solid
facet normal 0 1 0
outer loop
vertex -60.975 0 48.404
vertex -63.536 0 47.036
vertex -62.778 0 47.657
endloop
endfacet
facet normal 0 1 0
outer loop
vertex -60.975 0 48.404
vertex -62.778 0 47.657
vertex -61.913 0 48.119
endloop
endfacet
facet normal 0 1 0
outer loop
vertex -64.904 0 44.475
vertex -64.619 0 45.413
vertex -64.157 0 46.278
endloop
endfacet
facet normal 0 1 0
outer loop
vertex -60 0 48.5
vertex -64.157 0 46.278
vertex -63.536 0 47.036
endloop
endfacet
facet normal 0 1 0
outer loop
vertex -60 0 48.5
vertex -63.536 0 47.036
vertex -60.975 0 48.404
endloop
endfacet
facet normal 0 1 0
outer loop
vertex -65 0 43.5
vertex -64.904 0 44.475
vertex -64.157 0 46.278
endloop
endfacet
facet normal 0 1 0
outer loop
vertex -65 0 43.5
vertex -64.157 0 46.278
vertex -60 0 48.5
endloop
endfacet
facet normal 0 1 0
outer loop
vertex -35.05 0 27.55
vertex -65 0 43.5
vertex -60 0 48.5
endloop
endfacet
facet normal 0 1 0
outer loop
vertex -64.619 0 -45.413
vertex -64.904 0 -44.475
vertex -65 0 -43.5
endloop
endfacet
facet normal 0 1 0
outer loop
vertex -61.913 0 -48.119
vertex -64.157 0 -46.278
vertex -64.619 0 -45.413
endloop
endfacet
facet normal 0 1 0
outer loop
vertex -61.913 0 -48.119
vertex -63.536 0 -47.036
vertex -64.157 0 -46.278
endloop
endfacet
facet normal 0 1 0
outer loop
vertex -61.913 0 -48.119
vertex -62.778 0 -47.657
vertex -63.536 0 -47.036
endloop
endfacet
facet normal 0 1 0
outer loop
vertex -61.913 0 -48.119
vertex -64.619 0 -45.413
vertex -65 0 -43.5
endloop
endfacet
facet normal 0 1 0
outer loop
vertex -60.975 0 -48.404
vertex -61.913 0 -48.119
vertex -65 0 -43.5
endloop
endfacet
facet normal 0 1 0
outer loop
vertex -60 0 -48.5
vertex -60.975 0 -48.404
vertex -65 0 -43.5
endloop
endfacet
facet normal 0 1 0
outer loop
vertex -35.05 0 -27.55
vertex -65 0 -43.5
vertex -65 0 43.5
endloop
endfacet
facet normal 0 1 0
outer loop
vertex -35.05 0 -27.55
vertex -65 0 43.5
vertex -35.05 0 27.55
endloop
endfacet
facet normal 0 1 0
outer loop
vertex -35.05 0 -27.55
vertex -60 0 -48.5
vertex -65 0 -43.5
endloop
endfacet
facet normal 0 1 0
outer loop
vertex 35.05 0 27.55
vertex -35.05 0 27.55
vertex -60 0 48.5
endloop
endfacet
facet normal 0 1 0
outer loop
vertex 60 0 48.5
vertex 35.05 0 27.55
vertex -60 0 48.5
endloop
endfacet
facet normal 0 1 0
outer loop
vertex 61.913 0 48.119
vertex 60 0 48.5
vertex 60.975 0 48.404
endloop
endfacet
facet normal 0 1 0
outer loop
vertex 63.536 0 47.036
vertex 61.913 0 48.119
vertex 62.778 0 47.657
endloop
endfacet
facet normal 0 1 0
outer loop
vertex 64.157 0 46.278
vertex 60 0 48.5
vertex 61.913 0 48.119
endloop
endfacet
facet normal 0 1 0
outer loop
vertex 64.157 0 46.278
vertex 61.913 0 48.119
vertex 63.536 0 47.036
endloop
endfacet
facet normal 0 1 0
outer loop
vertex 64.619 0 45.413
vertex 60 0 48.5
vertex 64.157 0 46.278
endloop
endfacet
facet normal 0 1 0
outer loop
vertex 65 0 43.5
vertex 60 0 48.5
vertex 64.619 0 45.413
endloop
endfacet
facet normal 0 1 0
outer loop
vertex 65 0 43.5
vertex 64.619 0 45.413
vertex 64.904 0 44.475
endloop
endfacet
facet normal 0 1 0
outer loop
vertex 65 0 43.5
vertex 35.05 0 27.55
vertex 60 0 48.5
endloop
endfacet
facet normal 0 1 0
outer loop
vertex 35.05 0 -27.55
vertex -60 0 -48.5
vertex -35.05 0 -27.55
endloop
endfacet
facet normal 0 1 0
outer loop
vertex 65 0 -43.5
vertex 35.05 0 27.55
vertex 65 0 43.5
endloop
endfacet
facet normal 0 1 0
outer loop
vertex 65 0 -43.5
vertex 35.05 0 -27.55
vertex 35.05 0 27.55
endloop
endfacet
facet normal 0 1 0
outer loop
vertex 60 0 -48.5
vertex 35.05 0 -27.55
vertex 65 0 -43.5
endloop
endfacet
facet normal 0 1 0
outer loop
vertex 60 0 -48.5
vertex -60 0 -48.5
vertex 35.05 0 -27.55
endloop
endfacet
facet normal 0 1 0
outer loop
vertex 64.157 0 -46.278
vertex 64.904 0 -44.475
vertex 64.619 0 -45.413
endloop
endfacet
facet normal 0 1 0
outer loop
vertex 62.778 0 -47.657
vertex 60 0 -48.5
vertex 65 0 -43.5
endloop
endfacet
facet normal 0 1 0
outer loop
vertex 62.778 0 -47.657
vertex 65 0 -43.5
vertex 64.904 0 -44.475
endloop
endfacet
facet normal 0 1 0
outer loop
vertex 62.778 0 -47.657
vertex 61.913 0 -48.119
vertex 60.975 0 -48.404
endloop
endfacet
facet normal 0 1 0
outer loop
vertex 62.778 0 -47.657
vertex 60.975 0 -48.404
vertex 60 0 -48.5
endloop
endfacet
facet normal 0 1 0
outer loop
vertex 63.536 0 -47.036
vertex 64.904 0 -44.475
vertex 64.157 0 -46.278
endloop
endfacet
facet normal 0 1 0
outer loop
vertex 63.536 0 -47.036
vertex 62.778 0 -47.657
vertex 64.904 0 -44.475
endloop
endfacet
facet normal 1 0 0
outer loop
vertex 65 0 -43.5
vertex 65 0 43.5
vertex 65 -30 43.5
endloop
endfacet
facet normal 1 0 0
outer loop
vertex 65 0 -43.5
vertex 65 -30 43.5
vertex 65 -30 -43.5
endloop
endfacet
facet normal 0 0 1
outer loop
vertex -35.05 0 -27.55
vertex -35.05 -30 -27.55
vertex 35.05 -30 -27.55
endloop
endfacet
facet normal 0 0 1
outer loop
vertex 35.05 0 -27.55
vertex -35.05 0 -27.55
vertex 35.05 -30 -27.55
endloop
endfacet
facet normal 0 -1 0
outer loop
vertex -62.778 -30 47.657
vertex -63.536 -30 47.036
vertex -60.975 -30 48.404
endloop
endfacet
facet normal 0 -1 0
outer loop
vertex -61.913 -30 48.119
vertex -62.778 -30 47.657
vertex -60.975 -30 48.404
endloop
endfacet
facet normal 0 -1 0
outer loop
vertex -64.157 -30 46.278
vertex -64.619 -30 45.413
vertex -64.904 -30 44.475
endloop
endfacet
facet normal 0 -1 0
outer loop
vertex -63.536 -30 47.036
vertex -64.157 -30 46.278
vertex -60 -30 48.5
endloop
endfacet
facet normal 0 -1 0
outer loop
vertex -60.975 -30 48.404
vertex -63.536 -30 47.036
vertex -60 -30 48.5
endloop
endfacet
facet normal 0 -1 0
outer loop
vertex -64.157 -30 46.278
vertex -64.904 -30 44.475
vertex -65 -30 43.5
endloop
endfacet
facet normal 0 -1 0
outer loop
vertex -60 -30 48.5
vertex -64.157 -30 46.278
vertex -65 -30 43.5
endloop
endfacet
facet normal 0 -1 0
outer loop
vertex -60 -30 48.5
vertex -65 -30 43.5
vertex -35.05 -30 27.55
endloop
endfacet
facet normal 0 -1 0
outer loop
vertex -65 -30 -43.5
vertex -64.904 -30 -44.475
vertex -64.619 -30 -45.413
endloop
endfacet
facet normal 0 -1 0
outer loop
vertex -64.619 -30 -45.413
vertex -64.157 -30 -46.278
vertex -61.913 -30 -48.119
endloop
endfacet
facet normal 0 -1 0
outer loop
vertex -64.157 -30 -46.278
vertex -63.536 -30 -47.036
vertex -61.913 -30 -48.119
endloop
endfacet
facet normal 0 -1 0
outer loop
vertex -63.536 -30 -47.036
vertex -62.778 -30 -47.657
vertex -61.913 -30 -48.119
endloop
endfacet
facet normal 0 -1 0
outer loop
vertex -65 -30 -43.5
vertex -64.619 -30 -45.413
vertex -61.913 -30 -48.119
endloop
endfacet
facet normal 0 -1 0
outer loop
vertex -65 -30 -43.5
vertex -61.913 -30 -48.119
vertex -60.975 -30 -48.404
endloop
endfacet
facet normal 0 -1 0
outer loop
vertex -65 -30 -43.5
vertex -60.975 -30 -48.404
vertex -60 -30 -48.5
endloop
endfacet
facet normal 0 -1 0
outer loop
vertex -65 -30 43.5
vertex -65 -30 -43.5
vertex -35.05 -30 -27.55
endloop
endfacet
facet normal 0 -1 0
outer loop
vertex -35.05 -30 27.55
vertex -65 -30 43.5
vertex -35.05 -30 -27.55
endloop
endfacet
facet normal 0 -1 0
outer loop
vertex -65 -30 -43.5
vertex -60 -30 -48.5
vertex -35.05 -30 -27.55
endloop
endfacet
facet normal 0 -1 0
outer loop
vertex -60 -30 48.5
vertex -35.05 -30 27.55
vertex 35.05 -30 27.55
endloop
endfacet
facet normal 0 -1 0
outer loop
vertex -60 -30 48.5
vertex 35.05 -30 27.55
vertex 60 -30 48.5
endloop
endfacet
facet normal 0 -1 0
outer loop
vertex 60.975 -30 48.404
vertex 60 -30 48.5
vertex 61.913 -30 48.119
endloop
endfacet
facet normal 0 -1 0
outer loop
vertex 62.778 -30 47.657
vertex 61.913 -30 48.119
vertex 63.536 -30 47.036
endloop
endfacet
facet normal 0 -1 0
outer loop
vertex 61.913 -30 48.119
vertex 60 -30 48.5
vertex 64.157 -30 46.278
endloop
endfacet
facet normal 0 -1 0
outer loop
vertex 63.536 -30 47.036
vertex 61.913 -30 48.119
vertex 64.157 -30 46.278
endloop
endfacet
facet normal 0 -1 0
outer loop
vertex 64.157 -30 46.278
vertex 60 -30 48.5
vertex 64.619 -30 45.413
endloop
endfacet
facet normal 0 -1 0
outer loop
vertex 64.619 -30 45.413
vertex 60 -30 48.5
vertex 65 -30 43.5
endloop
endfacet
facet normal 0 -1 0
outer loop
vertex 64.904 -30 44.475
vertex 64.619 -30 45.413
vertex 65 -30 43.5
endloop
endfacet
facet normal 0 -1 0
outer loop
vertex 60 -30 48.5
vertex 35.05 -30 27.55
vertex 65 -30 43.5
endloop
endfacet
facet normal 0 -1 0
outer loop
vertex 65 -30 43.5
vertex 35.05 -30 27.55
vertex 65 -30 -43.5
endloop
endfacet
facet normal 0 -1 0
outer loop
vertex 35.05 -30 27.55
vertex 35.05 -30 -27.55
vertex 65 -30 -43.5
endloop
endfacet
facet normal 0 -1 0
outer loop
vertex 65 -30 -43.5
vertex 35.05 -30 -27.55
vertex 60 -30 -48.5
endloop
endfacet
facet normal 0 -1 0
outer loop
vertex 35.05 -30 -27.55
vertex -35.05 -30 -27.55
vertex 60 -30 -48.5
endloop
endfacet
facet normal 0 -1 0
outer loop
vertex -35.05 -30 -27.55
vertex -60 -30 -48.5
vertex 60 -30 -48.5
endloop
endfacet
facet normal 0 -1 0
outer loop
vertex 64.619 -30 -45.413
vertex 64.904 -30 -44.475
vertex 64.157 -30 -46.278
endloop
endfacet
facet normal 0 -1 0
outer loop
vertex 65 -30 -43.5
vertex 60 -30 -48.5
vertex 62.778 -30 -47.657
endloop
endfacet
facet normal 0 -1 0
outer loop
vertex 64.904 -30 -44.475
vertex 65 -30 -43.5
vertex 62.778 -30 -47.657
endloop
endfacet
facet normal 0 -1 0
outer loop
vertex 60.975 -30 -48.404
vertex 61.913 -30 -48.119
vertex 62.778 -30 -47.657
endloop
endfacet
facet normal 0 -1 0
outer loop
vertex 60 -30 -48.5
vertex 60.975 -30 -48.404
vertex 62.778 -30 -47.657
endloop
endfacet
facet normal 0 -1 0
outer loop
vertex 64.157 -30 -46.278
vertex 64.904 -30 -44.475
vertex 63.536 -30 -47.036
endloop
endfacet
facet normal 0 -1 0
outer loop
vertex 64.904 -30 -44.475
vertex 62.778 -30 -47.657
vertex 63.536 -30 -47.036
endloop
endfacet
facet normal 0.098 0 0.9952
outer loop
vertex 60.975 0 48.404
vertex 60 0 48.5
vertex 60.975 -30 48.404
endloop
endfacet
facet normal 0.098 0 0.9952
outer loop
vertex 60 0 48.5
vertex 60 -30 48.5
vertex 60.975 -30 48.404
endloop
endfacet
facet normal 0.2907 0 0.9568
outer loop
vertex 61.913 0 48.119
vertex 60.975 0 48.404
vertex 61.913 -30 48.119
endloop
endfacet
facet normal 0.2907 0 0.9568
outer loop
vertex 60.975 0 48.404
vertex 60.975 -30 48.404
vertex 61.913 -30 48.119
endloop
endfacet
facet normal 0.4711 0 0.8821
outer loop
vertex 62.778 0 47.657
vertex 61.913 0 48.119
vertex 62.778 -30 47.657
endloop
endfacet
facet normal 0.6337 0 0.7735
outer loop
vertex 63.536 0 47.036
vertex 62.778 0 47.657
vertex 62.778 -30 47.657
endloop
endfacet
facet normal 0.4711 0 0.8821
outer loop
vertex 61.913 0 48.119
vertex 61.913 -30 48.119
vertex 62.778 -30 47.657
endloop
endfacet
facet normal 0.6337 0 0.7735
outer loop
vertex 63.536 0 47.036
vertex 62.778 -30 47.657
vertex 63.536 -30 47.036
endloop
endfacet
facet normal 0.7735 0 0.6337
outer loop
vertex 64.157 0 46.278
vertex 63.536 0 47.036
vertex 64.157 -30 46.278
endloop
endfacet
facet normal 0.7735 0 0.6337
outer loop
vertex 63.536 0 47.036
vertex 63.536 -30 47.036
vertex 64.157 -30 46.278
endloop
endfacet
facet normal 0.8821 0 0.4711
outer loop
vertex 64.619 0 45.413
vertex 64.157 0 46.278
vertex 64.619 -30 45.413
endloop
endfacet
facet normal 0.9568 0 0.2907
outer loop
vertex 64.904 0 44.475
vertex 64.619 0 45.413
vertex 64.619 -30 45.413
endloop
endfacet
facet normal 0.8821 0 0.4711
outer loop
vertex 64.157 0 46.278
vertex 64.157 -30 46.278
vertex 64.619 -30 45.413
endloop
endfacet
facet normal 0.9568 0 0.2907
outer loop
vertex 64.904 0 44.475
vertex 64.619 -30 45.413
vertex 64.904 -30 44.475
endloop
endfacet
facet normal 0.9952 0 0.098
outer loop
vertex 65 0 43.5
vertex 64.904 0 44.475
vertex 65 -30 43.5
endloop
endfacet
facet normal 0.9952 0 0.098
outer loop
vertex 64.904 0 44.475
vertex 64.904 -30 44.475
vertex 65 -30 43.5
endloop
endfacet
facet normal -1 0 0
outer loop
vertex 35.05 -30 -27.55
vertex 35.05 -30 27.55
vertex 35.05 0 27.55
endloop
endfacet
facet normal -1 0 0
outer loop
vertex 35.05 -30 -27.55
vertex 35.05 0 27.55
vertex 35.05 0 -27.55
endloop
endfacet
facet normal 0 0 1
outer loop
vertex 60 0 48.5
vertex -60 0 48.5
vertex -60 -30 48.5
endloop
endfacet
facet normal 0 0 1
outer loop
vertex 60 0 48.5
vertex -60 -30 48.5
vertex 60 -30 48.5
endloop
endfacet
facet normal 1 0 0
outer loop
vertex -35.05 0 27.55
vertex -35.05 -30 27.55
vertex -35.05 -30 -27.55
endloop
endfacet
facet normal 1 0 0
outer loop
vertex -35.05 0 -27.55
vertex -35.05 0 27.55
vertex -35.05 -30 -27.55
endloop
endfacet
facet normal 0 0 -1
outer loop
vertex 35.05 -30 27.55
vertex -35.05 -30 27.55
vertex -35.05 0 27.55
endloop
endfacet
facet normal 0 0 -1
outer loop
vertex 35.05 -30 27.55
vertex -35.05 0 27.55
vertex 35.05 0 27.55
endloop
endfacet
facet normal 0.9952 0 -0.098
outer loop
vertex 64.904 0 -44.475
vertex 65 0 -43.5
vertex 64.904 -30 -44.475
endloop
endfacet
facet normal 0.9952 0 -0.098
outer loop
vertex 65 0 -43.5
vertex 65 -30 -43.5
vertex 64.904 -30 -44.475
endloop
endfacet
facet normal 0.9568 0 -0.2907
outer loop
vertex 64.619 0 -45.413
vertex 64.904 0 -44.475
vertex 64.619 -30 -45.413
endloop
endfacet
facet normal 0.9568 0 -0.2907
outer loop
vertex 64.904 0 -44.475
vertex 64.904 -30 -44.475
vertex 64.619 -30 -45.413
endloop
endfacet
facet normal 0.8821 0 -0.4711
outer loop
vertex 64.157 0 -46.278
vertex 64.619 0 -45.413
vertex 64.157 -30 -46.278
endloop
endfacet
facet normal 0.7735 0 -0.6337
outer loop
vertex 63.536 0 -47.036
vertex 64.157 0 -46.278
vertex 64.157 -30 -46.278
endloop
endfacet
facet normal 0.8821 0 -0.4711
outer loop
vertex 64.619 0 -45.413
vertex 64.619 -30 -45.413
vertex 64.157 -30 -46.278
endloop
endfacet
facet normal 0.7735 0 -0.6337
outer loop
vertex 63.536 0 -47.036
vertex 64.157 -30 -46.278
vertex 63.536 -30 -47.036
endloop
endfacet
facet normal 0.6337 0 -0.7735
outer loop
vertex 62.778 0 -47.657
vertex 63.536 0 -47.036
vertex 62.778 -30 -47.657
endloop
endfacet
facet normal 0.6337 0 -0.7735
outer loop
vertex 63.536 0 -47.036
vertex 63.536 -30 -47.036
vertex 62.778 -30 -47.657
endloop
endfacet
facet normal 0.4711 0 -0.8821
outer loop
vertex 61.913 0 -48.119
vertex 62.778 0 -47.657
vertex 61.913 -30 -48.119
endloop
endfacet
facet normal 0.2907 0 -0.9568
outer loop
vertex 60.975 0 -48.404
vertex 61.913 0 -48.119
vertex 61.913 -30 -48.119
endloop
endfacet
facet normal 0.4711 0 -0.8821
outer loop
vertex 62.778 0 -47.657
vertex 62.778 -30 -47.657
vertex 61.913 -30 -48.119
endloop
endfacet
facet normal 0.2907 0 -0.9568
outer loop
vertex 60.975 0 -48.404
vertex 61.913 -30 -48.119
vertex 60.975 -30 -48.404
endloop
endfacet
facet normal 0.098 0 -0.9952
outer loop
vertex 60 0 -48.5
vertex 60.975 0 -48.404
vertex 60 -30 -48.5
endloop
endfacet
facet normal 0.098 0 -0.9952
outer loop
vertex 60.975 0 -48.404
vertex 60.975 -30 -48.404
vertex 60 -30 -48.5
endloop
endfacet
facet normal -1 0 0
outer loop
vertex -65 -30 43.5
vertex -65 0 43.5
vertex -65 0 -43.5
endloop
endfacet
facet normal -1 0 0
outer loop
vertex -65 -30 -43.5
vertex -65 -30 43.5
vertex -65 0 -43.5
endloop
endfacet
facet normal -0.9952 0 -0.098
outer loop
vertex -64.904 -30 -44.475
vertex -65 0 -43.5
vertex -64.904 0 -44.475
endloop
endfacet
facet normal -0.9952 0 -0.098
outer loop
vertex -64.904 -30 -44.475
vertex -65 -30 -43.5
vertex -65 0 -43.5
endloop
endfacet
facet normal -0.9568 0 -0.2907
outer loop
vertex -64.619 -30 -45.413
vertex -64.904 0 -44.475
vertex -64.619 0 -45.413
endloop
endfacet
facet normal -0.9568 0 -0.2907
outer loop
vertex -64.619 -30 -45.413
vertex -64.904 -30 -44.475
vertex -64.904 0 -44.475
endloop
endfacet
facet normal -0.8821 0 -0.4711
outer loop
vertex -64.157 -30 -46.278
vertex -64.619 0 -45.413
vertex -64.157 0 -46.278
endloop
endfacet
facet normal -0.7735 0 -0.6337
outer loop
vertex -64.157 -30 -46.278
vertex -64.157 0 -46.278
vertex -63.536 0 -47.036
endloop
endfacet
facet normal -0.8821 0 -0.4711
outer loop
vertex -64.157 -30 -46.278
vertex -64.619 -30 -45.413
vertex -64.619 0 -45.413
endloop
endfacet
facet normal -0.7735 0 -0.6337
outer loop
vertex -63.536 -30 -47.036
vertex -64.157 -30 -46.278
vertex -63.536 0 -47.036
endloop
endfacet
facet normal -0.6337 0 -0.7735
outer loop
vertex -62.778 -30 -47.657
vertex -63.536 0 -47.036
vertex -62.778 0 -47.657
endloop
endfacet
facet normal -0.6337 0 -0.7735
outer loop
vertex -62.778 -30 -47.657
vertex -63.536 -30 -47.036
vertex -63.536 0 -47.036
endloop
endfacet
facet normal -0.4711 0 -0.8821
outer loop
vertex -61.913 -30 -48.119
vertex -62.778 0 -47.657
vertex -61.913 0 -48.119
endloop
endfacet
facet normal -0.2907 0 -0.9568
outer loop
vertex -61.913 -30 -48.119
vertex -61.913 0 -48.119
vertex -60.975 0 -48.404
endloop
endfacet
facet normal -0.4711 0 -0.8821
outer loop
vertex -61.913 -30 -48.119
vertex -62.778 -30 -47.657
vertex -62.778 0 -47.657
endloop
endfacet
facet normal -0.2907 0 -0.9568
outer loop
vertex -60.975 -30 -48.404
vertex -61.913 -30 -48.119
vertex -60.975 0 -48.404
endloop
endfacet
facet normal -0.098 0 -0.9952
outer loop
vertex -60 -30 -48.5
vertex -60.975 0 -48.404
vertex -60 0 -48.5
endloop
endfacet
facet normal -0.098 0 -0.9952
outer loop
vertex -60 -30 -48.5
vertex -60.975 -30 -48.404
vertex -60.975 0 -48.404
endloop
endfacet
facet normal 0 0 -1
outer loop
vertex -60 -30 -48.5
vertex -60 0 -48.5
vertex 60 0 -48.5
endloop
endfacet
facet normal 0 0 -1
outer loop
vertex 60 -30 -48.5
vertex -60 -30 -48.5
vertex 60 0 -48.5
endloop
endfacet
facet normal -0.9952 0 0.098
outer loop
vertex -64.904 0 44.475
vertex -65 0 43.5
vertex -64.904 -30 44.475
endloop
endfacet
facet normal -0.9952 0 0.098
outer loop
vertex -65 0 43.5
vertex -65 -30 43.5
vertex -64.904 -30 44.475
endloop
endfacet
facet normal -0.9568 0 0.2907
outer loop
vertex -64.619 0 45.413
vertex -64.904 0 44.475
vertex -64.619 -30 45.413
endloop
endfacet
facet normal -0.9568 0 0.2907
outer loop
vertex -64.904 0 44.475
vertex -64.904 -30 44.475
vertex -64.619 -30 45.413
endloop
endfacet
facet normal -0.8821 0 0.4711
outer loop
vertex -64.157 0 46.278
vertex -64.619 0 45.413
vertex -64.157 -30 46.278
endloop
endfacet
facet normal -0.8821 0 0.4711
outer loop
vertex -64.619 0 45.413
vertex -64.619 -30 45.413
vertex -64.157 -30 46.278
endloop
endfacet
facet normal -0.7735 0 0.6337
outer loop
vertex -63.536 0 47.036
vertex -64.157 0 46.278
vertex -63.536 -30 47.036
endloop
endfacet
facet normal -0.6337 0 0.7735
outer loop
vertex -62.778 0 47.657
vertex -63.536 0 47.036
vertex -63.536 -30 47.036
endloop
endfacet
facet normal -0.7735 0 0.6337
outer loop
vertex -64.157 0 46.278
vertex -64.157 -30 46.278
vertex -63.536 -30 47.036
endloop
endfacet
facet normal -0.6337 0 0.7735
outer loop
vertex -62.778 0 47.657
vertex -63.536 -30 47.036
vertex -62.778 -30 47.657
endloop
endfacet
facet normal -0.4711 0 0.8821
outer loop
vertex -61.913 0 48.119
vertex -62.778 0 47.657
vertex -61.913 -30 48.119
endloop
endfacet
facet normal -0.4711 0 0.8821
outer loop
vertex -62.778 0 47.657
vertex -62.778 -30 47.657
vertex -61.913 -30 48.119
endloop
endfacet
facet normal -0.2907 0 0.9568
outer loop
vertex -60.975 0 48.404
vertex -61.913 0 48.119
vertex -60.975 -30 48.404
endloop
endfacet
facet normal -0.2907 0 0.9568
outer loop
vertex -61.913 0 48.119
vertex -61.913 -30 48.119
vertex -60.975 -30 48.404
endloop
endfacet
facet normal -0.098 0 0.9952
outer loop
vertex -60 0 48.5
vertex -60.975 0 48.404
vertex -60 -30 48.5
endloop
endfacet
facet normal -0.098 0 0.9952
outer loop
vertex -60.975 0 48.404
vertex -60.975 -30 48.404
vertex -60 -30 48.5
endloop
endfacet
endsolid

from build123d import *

# Parameters (mm, degrees)
SKETCH1_W           = 130
SKETCH1_H           = 97
BOSS_EXTRUDE1_DEPTH = 30
FILLET1_R           = 5
SKETCH2_W           = 70.1
SKETCH2_H           = 55.1
CUT_EXTRUDE3_DEPTH  = 87.471093436


with BuildPart() as part:
    # Sketch1 → Boss-Extrude1 (new body)
    with BuildSketch(Plane(origin=(0, 0, 0), x_dir=(1, 0, 0), z_dir=(0, 1, 0))):
        Rectangle(SKETCH1_W, SKETCH1_H)
    extrude(amount=-BOSS_EXTRUDE1_DEPTH)

    # Fillet1
    fillet1_edges = [part.edges().sort_by_distance(p)[0] for p in [
        (65, -15, 48.5),
        (-65, -15, 48.5),
        (-65, -15, -48.5),
        (65, -15, -48.5),
    ]]
    fillet(fillet1_edges, radius=FILLET1_R)

    # Sketch2 → Cut-Extrude3 (cut, through all)
    with BuildSketch(Plane(origin=(0, -30, 0), x_dir=(1, 0, 0), z_dir=(0, 1, 0))):
        Rectangle(SKETCH2_W, SKETCH2_H)
    extrude(amount=CUT_EXTRUDE3_DEPTH, mode=Mode.SUBTRACT)


solid = part.part
